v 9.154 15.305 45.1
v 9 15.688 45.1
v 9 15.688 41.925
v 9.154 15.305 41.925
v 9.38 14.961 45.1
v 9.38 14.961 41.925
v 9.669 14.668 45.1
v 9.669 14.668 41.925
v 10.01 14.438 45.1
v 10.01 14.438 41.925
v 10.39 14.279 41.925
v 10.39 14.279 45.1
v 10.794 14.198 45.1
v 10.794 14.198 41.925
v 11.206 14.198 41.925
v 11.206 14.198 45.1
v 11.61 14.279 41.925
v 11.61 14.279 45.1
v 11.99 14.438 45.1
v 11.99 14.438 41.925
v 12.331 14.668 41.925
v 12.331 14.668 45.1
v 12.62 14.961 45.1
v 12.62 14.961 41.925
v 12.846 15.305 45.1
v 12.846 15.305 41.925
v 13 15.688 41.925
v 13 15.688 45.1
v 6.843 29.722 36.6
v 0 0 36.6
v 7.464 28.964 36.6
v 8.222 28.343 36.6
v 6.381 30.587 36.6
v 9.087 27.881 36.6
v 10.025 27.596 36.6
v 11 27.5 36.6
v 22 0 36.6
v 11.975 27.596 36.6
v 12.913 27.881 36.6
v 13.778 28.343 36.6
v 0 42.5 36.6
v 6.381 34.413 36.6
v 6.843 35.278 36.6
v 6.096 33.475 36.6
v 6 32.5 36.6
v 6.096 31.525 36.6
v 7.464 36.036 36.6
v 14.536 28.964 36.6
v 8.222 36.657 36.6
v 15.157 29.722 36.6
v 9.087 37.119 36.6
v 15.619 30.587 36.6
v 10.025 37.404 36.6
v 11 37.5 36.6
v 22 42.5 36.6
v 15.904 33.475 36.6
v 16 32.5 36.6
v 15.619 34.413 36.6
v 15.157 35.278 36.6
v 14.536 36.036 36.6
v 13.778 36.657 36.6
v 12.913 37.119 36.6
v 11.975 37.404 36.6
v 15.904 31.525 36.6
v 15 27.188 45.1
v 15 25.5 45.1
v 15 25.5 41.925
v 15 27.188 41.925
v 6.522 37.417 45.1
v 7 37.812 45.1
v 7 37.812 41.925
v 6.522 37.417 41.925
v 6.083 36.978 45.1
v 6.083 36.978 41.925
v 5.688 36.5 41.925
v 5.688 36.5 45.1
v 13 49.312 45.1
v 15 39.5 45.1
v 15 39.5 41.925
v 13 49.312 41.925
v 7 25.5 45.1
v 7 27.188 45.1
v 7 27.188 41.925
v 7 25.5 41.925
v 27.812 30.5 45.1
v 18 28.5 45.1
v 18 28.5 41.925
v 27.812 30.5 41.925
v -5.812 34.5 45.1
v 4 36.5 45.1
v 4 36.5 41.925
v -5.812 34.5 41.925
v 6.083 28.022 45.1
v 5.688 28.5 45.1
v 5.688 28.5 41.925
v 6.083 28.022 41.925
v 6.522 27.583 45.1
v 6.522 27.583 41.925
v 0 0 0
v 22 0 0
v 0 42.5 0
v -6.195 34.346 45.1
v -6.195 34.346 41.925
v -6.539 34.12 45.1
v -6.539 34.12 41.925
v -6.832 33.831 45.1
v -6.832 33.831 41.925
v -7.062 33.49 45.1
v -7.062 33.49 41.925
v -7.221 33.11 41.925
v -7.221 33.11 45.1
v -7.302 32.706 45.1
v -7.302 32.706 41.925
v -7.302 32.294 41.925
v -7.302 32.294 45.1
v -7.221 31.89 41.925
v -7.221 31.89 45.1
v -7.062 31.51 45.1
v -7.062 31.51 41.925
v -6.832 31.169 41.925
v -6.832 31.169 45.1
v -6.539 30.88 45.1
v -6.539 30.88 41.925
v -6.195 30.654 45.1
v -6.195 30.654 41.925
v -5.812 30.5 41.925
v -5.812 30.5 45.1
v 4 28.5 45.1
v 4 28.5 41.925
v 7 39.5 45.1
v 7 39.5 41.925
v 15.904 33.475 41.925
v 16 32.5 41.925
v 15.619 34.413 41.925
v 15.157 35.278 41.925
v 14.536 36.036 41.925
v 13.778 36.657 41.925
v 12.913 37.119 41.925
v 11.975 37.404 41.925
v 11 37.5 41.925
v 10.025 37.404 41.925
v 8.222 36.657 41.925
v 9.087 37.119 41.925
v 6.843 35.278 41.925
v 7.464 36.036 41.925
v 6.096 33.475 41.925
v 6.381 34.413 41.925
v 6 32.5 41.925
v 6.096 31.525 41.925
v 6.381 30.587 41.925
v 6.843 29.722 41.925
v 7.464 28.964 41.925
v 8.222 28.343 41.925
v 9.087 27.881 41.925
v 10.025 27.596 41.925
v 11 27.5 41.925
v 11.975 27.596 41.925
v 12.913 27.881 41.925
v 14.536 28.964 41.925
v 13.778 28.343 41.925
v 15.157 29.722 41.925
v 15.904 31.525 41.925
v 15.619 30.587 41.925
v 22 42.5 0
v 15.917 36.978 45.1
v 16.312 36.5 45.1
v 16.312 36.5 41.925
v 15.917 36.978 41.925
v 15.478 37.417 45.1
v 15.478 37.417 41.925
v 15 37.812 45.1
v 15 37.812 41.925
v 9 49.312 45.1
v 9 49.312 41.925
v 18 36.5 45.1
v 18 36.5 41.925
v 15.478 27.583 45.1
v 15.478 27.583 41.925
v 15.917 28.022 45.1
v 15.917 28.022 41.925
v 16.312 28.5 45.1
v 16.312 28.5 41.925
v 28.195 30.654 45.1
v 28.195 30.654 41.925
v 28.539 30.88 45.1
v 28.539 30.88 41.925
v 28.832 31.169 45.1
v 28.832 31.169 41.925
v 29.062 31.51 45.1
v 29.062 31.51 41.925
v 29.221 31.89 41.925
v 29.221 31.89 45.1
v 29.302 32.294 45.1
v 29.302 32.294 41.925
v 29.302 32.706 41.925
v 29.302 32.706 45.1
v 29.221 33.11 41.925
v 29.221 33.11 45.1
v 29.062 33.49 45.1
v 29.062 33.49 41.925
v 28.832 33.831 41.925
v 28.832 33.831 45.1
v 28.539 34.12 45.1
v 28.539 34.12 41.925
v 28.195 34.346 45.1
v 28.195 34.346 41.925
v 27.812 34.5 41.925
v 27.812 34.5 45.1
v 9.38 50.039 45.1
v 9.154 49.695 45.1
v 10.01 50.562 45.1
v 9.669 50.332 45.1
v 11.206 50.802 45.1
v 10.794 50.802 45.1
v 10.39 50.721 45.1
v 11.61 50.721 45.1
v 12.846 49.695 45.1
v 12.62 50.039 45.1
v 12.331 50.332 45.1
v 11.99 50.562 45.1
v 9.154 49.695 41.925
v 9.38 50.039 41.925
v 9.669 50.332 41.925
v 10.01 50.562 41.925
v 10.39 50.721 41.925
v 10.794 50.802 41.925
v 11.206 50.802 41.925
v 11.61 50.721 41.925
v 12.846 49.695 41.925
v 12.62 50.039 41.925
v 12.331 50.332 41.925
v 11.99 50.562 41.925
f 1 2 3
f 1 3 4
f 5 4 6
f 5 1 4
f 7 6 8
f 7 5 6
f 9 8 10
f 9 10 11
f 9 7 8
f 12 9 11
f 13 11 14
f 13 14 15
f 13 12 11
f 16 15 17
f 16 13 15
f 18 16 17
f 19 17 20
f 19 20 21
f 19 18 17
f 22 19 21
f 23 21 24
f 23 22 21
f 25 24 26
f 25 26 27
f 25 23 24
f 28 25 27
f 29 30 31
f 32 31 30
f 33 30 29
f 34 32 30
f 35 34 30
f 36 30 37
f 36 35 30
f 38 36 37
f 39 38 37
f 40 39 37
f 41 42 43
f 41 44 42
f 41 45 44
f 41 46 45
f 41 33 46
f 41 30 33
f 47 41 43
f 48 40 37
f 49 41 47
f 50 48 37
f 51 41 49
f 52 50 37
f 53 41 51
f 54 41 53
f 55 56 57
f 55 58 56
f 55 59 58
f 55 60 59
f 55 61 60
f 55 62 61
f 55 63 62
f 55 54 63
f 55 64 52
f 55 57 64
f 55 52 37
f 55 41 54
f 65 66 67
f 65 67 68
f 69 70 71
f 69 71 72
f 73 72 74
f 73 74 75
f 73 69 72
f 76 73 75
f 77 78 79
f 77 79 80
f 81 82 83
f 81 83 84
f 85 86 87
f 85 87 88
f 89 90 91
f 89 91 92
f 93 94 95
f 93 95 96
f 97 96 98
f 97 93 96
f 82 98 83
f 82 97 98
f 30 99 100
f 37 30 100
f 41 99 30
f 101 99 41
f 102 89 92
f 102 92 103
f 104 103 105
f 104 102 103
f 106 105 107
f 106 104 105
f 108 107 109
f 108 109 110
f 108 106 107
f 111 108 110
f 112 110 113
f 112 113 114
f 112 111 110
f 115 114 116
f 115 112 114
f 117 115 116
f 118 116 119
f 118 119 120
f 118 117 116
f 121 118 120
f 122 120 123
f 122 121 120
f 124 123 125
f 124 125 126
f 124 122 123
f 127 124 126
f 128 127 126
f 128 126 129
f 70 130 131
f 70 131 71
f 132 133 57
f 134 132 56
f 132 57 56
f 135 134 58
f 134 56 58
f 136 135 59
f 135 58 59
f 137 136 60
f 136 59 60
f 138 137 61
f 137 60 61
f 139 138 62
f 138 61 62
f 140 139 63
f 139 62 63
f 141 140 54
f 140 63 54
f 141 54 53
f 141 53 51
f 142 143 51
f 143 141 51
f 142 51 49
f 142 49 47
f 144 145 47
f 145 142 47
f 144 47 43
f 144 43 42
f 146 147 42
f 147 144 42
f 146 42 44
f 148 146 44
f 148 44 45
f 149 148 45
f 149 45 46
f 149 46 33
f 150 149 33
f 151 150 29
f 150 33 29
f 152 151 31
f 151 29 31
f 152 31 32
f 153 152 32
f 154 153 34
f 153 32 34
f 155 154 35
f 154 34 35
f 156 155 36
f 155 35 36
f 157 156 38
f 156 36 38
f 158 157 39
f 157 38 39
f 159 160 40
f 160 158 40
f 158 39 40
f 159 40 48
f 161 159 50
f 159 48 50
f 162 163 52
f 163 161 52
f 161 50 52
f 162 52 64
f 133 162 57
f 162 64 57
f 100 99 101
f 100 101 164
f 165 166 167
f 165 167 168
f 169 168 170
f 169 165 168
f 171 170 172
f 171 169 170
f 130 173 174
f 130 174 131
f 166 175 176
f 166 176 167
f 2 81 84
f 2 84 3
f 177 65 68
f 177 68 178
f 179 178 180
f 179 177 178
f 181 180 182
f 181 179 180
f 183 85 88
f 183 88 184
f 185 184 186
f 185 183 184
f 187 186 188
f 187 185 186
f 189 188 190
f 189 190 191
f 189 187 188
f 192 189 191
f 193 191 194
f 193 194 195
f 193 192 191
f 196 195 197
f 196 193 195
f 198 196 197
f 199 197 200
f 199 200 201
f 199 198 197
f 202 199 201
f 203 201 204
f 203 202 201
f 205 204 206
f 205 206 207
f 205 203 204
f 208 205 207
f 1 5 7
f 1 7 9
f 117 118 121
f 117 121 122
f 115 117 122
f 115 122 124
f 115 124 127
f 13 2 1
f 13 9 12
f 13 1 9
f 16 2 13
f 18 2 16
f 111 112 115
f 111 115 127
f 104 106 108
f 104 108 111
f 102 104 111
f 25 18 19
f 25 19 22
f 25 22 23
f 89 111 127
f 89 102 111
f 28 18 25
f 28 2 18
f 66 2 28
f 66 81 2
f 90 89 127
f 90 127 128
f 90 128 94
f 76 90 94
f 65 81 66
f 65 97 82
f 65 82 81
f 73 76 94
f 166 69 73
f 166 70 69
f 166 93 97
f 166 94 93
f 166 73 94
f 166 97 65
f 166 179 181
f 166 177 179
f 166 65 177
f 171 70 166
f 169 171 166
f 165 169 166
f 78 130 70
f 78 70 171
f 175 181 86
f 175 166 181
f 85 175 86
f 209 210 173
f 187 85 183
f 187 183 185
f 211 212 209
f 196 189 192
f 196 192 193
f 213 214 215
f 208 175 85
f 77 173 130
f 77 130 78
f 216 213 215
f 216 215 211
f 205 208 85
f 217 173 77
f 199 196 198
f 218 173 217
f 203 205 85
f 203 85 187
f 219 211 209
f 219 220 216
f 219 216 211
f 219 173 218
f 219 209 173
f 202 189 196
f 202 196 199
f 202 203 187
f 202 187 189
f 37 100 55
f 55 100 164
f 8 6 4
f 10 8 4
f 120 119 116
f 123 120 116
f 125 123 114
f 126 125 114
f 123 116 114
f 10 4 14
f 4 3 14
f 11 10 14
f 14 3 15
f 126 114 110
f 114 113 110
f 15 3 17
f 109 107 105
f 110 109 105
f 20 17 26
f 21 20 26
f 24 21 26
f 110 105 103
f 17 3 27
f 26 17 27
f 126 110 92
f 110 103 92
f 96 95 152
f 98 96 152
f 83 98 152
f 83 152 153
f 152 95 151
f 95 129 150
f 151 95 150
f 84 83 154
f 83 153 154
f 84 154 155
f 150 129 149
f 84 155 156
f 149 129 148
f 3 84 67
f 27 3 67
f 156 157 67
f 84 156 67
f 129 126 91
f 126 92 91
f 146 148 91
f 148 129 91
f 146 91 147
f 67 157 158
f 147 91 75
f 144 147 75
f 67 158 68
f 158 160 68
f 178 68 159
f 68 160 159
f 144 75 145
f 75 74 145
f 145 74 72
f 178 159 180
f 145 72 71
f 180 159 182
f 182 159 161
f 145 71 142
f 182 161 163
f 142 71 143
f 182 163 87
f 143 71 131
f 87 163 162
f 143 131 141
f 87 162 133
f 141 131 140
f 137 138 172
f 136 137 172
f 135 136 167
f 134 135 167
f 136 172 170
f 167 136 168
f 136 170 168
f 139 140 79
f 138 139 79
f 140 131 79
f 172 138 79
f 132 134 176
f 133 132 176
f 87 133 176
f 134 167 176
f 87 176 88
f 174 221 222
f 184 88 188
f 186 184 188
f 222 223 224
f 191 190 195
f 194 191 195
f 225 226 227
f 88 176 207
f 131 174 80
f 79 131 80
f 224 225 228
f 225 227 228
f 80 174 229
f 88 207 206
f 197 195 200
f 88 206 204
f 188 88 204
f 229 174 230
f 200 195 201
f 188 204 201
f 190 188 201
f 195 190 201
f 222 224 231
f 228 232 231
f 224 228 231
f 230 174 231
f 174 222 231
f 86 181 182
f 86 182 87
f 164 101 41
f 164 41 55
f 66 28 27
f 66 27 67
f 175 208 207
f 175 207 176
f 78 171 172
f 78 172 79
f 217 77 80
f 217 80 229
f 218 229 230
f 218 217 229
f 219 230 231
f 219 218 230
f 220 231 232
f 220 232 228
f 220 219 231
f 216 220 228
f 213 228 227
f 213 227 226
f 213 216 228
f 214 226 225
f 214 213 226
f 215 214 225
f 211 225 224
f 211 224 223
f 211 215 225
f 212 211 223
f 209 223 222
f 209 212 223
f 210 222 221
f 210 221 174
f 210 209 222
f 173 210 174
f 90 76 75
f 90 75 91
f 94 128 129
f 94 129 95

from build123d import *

# Parameters (mm, degrees)
F0_W     = 22
F0_H     = 42.5
F1_DEPTH = 36.6
F2_R     = 5
F3_DEPTH = 8.5
F6_DEPTH = 3.175
F7_DEPTH = 3.175
F8_COUNT = 4


with BuildPart() as f1:
    # F0 (on Top) → F1 (new body)
    with BuildSketch(Plane.XY):
        with Locations((11, 21.25)):
            Rectangle(F0_W, F0_H)
    extrude(amount=F1_DEPTH)

    # F2 (on face) → F3 (join)
    with BuildSketch(Plane.XY.offset(36.6)):
        with Locations((11, 32.5)):
            Circle(F2_R)
    extrude(amount=F3_DEPTH)

    # F5 (on offset) → F6 (join)
    with BuildSketch(Plane.XY.offset(45.1)):
        with BuildLine():
            ThreePointArc((7, 37.8124852941), (8.0316250237, 26.5492647513), (17.65, 32.5))
            ThreePointArc((17.65, 32.5), (16.9507352487, 35.4683749763), (15, 37.8124852941))
            Line((15, 37.8124852941), (7, 37.8124852941))
        make_face()
        with BuildLine():
            Line((7, 37.8124852941), (15, 37.8124852941))
            ThreePointArc((15, 37.8124852941), (11, 39.15), (7, 37.8124852941))
        make_face()
    extrude(amount=-F6_DEPTH)



with BuildPart() as f7:
    # F5 (on offset) → F7 (new body)
    with BuildSketch(Plane.XY.offset(45.1)):
        with BuildLine():
            ThreePointArc((7, 37.8124852941), (11, 39.15), (15, 37.8124852941))
            Line((15, 37.8124852941), (15, 39.5))
            Line((15, 39.5), (13, 49.3124852941))
            ThreePointArc((13, 49.3124852941), (11, 50.8124852941), (9, 49.3124852941))
            Line((9, 49.3124852941), (7, 39.5))
            Line((7, 39.5), (7, 37.8124852941))
        make_face()
    extrude(amount=-F7_DEPTH)


with BuildPart() as f1_1:
    add(f1.part)

    add(f7.part)  # F8 merges F7
    # F8: F7 ×4 about axis
    f8_axis = Axis((11, 32.5, 45.1), (0, 0, 1))
    for i in range(1, F8_COUNT):
        add(f7.part.rotate(f8_axis, i * 360 / F8_COUNT))


solid = f1_1.part
